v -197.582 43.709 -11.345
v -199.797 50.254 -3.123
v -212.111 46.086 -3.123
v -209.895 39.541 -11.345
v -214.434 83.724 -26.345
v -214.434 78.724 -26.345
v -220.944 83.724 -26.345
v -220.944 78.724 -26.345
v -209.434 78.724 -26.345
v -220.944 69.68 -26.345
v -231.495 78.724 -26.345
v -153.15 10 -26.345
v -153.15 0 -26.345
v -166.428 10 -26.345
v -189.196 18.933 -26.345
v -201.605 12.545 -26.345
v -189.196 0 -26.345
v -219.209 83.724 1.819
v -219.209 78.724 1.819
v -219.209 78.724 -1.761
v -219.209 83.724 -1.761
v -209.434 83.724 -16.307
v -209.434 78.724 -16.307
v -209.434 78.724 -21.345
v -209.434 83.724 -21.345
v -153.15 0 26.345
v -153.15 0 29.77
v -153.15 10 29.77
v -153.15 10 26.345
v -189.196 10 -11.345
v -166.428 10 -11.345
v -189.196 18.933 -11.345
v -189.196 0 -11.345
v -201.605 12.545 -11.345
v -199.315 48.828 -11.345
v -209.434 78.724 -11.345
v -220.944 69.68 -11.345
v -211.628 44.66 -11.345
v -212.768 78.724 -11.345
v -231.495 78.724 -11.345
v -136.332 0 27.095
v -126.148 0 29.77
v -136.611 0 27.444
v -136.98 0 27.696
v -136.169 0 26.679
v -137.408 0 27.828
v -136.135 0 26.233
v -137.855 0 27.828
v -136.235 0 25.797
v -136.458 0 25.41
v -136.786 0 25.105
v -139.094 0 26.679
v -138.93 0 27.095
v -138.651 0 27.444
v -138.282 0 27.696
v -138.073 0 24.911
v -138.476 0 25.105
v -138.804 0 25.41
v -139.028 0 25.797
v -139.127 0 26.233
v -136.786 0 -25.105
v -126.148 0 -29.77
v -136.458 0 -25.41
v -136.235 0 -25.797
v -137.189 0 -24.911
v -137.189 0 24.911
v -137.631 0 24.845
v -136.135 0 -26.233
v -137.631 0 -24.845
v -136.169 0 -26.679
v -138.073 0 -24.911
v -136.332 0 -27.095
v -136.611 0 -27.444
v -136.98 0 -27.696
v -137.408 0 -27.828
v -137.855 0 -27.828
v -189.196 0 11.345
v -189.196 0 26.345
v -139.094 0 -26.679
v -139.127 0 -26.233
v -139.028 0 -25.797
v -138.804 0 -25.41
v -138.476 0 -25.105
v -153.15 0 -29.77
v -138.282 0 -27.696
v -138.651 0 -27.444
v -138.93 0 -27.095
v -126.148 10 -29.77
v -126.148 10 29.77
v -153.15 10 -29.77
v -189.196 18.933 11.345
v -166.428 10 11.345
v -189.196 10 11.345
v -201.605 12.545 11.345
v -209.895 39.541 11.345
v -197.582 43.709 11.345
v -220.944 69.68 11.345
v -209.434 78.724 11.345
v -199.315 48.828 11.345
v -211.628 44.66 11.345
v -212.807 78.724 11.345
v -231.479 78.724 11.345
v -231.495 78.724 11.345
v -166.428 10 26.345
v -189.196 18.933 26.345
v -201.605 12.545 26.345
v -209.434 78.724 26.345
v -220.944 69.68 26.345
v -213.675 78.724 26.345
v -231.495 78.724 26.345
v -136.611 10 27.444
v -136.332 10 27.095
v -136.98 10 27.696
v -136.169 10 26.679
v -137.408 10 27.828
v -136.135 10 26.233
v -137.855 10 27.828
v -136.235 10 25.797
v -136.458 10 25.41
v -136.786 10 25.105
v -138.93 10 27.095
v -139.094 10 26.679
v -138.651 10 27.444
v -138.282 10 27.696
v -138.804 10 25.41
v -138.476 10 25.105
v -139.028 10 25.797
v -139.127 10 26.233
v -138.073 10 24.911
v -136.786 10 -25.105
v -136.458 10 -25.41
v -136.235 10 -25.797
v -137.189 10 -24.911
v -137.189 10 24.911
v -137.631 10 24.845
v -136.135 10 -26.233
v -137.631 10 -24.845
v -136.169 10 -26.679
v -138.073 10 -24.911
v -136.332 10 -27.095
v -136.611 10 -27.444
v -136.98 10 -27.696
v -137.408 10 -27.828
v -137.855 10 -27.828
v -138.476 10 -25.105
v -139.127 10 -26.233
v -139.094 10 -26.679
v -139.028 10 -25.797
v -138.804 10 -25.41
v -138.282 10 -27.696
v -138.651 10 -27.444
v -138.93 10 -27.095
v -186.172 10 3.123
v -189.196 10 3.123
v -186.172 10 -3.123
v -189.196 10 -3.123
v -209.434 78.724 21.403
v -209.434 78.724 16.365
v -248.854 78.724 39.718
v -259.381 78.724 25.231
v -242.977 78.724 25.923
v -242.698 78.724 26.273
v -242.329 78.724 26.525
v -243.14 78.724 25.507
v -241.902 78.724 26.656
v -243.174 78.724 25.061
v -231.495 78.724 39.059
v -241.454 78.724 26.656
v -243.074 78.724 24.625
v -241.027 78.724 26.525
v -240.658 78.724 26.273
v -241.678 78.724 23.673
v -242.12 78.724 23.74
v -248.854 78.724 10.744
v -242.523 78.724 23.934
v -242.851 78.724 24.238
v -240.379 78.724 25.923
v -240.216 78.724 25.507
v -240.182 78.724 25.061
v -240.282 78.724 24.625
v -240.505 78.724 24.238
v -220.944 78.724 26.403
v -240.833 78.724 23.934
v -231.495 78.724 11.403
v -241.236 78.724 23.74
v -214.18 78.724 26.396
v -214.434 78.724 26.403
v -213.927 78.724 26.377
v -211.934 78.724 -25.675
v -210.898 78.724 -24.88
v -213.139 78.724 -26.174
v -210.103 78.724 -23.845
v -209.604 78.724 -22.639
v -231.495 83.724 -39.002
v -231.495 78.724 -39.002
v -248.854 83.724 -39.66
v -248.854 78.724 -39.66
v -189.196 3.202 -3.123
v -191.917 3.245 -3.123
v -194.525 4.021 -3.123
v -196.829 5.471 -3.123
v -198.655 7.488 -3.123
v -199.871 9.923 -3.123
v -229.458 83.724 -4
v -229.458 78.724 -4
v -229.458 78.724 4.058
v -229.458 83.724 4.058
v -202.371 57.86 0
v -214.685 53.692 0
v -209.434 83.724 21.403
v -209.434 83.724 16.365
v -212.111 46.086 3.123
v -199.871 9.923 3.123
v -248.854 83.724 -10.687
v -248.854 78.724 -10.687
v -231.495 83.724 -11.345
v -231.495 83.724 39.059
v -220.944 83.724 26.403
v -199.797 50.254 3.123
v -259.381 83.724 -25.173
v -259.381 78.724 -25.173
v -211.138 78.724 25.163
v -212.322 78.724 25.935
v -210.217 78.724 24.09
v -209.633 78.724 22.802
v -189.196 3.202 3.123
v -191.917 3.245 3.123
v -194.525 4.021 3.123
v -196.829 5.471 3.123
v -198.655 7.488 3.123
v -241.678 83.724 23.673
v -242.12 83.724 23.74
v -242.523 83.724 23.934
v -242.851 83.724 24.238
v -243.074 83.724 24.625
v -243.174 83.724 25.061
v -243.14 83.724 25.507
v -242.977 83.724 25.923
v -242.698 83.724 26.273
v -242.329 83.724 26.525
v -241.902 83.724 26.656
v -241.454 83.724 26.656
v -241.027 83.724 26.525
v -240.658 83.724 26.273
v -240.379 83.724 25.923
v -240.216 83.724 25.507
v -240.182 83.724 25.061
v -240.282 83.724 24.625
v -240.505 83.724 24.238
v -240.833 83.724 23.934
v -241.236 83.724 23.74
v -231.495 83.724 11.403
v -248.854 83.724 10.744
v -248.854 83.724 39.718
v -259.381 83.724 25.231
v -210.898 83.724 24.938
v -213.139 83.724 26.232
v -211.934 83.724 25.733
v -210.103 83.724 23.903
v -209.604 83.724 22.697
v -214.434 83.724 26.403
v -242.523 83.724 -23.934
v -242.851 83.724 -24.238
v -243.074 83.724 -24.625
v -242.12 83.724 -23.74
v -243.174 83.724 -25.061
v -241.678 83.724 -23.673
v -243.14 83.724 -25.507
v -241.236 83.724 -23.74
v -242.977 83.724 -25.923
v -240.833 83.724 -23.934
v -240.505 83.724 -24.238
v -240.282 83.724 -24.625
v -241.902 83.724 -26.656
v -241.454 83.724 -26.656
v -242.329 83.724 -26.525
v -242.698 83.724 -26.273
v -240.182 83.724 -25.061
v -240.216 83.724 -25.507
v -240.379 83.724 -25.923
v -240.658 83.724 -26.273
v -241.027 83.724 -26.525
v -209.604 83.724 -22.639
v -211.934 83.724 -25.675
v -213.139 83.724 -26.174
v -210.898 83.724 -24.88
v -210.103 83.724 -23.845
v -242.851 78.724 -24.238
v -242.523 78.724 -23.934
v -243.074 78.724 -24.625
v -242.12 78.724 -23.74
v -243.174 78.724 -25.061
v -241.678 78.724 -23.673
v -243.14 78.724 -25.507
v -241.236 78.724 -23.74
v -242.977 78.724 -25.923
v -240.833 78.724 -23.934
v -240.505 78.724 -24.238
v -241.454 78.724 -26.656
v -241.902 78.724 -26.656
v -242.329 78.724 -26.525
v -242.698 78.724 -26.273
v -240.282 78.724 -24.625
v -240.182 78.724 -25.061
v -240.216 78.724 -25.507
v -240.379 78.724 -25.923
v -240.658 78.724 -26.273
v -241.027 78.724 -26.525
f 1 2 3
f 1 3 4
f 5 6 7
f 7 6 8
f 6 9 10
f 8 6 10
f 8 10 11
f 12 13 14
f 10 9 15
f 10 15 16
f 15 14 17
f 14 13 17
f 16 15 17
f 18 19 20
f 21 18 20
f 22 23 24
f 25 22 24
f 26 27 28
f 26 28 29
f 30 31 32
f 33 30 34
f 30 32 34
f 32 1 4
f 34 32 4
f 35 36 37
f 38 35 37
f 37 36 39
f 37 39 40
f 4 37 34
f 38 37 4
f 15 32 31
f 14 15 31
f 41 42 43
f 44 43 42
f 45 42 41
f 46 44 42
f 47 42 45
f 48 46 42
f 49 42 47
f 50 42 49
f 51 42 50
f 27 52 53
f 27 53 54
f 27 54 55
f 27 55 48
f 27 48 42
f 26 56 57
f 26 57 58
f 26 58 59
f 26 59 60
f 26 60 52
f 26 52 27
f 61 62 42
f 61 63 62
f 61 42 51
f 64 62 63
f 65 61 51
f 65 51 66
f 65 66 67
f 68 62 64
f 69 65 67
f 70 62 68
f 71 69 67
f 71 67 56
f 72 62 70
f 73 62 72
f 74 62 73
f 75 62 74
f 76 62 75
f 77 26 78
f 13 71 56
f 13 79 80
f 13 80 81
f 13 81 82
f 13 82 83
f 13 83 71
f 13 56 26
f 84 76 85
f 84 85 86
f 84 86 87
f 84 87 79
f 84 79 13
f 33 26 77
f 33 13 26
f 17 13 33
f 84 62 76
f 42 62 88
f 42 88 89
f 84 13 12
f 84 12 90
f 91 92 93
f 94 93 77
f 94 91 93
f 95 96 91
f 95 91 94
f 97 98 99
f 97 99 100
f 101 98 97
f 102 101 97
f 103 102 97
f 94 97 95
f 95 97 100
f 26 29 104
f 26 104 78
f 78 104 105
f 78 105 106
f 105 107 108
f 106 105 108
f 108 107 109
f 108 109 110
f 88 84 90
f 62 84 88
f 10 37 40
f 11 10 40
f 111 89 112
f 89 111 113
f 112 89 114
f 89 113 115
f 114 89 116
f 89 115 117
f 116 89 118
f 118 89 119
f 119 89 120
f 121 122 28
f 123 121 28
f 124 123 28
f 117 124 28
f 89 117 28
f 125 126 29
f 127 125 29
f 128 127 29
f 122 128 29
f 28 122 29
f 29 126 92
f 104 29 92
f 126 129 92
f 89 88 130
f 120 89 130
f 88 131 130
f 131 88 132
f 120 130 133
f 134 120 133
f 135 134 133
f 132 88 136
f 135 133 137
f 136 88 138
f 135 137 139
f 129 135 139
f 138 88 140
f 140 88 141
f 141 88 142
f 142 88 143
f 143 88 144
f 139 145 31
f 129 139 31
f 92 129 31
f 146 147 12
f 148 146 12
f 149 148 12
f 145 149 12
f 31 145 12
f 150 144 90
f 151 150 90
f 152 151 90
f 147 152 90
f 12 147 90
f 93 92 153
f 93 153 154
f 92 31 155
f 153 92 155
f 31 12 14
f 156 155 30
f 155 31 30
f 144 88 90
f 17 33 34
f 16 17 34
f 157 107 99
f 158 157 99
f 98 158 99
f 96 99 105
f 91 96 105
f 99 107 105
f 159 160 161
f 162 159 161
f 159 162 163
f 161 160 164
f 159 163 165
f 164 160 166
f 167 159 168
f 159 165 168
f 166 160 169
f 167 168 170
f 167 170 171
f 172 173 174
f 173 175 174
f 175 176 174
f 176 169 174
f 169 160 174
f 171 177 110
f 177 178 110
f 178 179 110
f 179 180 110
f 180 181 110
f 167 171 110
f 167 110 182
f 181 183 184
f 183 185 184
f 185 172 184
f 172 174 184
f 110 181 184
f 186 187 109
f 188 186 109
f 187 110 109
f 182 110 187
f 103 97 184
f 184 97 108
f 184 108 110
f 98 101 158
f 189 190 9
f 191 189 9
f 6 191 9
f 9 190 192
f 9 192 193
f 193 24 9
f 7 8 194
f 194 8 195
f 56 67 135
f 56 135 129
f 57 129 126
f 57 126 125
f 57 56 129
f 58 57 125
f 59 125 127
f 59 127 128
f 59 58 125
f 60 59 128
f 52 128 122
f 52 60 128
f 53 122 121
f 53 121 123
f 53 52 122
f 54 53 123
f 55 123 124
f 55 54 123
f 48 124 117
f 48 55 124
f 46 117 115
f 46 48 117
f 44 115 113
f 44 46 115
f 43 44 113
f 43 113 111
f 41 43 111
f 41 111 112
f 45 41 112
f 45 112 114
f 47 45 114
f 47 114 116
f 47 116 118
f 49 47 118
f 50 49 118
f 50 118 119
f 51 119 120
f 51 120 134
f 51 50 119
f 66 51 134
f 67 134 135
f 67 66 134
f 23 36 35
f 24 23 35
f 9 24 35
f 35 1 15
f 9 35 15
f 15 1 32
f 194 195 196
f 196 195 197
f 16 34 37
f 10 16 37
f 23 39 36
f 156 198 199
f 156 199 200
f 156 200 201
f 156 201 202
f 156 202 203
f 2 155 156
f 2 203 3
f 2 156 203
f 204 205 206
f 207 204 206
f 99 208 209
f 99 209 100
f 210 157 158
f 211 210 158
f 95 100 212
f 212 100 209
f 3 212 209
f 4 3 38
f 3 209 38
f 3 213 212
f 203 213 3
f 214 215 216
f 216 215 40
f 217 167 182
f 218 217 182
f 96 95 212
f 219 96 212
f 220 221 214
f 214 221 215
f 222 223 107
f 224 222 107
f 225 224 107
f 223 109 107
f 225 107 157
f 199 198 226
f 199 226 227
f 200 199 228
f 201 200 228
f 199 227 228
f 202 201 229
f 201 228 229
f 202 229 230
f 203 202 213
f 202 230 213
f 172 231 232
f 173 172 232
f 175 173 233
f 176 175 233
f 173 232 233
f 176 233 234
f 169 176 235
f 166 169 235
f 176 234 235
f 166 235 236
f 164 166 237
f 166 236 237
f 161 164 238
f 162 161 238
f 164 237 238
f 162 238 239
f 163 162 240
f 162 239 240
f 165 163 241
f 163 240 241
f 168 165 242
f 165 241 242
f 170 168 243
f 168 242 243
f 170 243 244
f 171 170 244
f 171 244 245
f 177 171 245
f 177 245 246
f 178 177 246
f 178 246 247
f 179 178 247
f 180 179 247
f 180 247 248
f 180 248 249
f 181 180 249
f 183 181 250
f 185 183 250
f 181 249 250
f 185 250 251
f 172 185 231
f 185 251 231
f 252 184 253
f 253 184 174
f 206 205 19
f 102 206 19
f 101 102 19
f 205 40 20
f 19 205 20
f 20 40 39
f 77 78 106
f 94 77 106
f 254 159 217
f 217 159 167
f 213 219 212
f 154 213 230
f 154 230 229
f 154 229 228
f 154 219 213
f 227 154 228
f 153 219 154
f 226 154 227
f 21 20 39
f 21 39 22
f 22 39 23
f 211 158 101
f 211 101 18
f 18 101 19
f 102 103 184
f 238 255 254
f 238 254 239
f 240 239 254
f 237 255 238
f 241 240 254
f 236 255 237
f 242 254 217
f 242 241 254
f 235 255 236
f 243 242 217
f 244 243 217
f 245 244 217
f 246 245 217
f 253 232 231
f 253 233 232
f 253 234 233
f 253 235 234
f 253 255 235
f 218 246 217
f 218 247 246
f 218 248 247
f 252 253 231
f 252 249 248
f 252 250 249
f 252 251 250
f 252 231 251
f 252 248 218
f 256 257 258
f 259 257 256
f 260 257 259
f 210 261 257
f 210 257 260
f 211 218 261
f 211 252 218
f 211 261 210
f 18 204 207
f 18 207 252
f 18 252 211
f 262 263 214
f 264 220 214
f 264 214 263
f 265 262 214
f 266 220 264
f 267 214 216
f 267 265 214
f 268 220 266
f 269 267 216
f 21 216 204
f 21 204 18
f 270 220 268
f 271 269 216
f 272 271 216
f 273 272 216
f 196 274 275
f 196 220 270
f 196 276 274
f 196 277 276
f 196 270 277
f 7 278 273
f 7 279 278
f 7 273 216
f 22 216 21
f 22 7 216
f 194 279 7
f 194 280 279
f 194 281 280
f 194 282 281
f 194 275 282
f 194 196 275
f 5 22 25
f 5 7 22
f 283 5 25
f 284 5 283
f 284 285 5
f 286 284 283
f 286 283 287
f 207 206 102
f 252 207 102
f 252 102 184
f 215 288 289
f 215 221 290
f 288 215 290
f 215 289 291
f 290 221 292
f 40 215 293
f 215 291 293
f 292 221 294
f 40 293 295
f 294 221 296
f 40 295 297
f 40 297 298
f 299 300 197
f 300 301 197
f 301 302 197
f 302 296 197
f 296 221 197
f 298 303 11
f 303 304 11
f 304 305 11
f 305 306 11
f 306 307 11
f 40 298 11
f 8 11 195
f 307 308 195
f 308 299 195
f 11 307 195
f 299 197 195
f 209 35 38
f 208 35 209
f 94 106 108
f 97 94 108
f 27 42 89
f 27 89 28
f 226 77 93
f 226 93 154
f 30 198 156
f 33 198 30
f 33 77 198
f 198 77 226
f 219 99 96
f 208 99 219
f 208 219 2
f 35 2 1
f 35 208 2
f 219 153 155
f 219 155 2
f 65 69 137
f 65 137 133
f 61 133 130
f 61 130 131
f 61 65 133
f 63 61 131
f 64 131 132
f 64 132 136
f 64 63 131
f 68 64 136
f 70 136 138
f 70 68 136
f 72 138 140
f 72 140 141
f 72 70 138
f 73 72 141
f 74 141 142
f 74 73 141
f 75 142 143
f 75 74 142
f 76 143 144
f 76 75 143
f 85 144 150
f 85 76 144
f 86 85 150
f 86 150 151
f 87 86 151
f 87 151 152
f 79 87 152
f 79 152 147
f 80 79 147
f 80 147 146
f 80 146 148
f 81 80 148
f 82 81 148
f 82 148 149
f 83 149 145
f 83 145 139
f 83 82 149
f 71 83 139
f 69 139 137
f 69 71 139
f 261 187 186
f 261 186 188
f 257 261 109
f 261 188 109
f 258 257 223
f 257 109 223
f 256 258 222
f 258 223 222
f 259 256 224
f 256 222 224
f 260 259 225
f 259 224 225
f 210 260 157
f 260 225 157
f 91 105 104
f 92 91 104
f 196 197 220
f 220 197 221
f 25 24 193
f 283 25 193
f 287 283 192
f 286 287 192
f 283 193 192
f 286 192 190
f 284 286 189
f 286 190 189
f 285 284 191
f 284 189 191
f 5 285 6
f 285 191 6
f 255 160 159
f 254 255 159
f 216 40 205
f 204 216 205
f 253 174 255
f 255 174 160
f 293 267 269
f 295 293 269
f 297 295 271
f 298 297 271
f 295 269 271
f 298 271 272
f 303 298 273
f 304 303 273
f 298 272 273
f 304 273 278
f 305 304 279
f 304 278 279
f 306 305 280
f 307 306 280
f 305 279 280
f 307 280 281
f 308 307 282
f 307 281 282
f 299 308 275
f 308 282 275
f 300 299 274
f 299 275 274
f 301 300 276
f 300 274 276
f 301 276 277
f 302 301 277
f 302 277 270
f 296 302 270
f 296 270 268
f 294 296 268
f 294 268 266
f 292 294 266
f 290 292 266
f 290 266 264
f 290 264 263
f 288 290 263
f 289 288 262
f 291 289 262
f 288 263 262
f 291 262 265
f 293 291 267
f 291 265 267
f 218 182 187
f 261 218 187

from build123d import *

# Parameters (mm, degrees)
CROQUIS1_R              = 1.5
SALIENTE_EXTRUIR1_DEPTH = 10
SALIENTE_EXTRUIR2_DEPTH = 15
MATRIZL1_COUNT          = 2
MATRIZL1_PITCH          = 37.68964915
SALIENTE_EXTRUIR3_DEPTH = 13
SALIENTE_EXTRUIR7_DEPTH = 5
REDONDEO2_R             = 10
CROQUIS11_R             = 1.5
CORTAR_EXTRUIR2_DEPTH   = 5


with BuildPart() as part:
    # Croquis1 → Saliente-Extruir1 (new body)
    with BuildSketch(Plane(origin=(0, 0, 0), x_dir=(1, 0, 0), z_dir=(0, 1, 0))):
        Polygon((-189.195504205, 26.344824576), (-153.149960772, 26.344824576), (-153.149960772, 29.769862991), (-126.147833027, 29.769862991), (-126.147833027, -29.769862991), (-153.149960772, -29.769862991), (-153.149960772, -26.344824576), (-189.195504205, -26.344824576), align=None)
        with Locations(Location((-137.631197841, 26.344824576, 0), (0, 0, 270))):
            Circle(CROQUIS1_R, mode=Mode.SUBTRACT)
        with Locations(Location((-137.631197841, -26.344824576, 0), (0, 0, 90))):
            Circle(CROQUIS1_R, mode=Mode.SUBTRACT)
    extrude(amount=SALIENTE_EXTRUIR1_DEPTH)

    # Croquis3 → Saliente-Extruir2 (add)
    with BuildSketch(Plane.XY.offset(26.344824576)):
        Polygon((-189.195504205, 0), (-201.604805992, 12.545329197), (-220.943628409, 69.680078214), (-231.495067756, 78.724169083), (-209.43357333, 78.724169083), (-189.195504205, 18.932679451), (-166.427858451, 10), (-166.427858451, 0), align=None)
    saliente_extruir2 = extrude(amount=-SALIENTE_EXTRUIR2_DEPTH)

    # MatrizL1: Saliente-Extruir2 ×2
    with Locations(*[(0, 0, -i * MATRIZL1_PITCH) for i in range(1, MATRIZL1_COUNT)]):
        add(saliente_extruir2)

    # Croquis8 → Saliente-Extruir3 (add)
    with BuildSketch(Plane(origin=(-163.998418841, -55.509761627, 0), x_dir=(0, 0, -1), z_dir=(0.9472114013741786, 0.3206096709501519, 0))):
        Polygon((-11.344824576, 110.153008866), (-11.344824576, 104.748047896), (-3.12328674, 111.657611587), (-3.12328674, 63.690909236), (3.123286737, 63.690909236), (3.123286737, 111.657611587), (11.344824574, 104.748047896), (11.344824574, 110.153008866), (-1e-09, 119.687452364), align=None)
    extrude(amount=-SALIENTE_EXTRUIR3_DEPTH)

    # Croquis10 → Saliente-Extruir7 (add)
    with BuildSketch(Plane(origin=(0, 78.724169083, 0), x_dir=(1, 0, 0), z_dir=(0, 1, 0))):
        with BuildLine():
            Line((-214.43357333, 26.344824574), (-220.943628409, 26.344824574))
            Line((-220.943628409, 26.344824574), (-231.495067756, 39.001543724))
            Line((-231.495067756, 39.001543724), (-248.853619127, 39.65983126))
            Line((-248.853619127, 39.65983126), (-259.380857056, 25.173184149))
            Line((-259.380857056, 25.173184149), (-248.853619127, 10.686537038))
            Line((-248.853619127, 10.686537038), (-231.495067756, 11.344824574))
            Line((-231.495067756, 11.344824574), (-229.458019065, 3.999750012))
            Line((-229.458019065, 3.999750012), (-229.458019065, -4.057622202))
            Line((-229.458019065, -4.057622202), (-231.495067756, -11.402696763))
            Line((-231.495067756, -11.402696763), (-248.853619127, -10.744409227))
            Line((-248.853619127, -10.744409227), (-259.380857056, -25.231056338))
            Line((-259.380857056, -25.231056338), (-248.853619127, -39.71770345))
            Line((-248.853619127, -39.71770345), (-231.495067756, -39.059415914))
            Line((-231.495067756, -39.059415914), (-220.943628409, -26.402696763))
            Line((-220.943628409, -26.402696763), (-214.43357333, -26.402696763))
            ThreePointArc((-214.43357333, -26.402696763), (-210.898039424, -24.938230669), (-209.43357333, -21.402696763))
            Line((-209.43357333, -21.402696763), (-209.43357333, -16.36524325))
            Line((-209.43357333, -16.36524325), (-219.208523363, -1.818697081))
            Line((-219.208523363, -1.818697081), (-219.208523363, 1.760824892))
            Line((-219.208523363, 1.760824892), (-209.43357333, 16.30737106))
            Line((-209.43357333, 16.30737106), (-209.43357333, 21.344824574))
            ThreePointArc((-209.43357333, 21.344824574), (-210.898039424, 24.880358479), (-214.43357333, 26.344824574))
        make_face()
    extrude(amount=SALIENTE_EXTRUIR7_DEPTH)

    # Redondeo2
    # the kernel refuses this fillet: 10 mm, written as the material it takes off along each edge
    with BuildSketch(Plane(origin=(-196.732088511, 0.651068043, 27.595787298), x_dir=(-0.3206096709501526, 0.9472114013741784, 0), z_dir=(0, 0, -1))) as redondeo2_piece_1_section:
        with BuildLine():
            CenterArc((9.789000223, 10), REDONDEO2_R, 191.790853222, 78.209146778)
            Line((0, 7.956602185), (0, 0))
            Line((0, 0), (9.789000223, 0))
        make_face()
    redondeo2_piece_1 = extrude(amount=30.719074034, mode=Mode.PRIVATE)
    redondeo2_piece_1 = split(redondeo2_piece_1, bisect_by=Plane(origin=(-197.071889221, 5.655111801, 11.344824576), z_dir=(0, 0, -1)), keep=Keep.TOP, mode=Mode.PRIVATE)
    add(redondeo2_piece_1, mode=Mode.SUBTRACT)

    # Croquis11 → Cortar-Extruir2 (cut)
    with BuildSketch(Plane(origin=(0, 83.724169083, 0), x_dir=(1, 0, 0), z_dir=(0, 1, 0))):
        with Locations(Location((-241.678058983, 25.173184149, 0), (0, 0, 270))):
            Circle(CROQUIS11_R)
        with Locations(Location((-241.678058983, -25.173184149, 0), (0, 0, 90))):
            Circle(CROQUIS11_R)
    extrude(amount=-CORTAR_EXTRUIR2_DEPTH, mode=Mode.SUBTRACT)


solid = part.part
